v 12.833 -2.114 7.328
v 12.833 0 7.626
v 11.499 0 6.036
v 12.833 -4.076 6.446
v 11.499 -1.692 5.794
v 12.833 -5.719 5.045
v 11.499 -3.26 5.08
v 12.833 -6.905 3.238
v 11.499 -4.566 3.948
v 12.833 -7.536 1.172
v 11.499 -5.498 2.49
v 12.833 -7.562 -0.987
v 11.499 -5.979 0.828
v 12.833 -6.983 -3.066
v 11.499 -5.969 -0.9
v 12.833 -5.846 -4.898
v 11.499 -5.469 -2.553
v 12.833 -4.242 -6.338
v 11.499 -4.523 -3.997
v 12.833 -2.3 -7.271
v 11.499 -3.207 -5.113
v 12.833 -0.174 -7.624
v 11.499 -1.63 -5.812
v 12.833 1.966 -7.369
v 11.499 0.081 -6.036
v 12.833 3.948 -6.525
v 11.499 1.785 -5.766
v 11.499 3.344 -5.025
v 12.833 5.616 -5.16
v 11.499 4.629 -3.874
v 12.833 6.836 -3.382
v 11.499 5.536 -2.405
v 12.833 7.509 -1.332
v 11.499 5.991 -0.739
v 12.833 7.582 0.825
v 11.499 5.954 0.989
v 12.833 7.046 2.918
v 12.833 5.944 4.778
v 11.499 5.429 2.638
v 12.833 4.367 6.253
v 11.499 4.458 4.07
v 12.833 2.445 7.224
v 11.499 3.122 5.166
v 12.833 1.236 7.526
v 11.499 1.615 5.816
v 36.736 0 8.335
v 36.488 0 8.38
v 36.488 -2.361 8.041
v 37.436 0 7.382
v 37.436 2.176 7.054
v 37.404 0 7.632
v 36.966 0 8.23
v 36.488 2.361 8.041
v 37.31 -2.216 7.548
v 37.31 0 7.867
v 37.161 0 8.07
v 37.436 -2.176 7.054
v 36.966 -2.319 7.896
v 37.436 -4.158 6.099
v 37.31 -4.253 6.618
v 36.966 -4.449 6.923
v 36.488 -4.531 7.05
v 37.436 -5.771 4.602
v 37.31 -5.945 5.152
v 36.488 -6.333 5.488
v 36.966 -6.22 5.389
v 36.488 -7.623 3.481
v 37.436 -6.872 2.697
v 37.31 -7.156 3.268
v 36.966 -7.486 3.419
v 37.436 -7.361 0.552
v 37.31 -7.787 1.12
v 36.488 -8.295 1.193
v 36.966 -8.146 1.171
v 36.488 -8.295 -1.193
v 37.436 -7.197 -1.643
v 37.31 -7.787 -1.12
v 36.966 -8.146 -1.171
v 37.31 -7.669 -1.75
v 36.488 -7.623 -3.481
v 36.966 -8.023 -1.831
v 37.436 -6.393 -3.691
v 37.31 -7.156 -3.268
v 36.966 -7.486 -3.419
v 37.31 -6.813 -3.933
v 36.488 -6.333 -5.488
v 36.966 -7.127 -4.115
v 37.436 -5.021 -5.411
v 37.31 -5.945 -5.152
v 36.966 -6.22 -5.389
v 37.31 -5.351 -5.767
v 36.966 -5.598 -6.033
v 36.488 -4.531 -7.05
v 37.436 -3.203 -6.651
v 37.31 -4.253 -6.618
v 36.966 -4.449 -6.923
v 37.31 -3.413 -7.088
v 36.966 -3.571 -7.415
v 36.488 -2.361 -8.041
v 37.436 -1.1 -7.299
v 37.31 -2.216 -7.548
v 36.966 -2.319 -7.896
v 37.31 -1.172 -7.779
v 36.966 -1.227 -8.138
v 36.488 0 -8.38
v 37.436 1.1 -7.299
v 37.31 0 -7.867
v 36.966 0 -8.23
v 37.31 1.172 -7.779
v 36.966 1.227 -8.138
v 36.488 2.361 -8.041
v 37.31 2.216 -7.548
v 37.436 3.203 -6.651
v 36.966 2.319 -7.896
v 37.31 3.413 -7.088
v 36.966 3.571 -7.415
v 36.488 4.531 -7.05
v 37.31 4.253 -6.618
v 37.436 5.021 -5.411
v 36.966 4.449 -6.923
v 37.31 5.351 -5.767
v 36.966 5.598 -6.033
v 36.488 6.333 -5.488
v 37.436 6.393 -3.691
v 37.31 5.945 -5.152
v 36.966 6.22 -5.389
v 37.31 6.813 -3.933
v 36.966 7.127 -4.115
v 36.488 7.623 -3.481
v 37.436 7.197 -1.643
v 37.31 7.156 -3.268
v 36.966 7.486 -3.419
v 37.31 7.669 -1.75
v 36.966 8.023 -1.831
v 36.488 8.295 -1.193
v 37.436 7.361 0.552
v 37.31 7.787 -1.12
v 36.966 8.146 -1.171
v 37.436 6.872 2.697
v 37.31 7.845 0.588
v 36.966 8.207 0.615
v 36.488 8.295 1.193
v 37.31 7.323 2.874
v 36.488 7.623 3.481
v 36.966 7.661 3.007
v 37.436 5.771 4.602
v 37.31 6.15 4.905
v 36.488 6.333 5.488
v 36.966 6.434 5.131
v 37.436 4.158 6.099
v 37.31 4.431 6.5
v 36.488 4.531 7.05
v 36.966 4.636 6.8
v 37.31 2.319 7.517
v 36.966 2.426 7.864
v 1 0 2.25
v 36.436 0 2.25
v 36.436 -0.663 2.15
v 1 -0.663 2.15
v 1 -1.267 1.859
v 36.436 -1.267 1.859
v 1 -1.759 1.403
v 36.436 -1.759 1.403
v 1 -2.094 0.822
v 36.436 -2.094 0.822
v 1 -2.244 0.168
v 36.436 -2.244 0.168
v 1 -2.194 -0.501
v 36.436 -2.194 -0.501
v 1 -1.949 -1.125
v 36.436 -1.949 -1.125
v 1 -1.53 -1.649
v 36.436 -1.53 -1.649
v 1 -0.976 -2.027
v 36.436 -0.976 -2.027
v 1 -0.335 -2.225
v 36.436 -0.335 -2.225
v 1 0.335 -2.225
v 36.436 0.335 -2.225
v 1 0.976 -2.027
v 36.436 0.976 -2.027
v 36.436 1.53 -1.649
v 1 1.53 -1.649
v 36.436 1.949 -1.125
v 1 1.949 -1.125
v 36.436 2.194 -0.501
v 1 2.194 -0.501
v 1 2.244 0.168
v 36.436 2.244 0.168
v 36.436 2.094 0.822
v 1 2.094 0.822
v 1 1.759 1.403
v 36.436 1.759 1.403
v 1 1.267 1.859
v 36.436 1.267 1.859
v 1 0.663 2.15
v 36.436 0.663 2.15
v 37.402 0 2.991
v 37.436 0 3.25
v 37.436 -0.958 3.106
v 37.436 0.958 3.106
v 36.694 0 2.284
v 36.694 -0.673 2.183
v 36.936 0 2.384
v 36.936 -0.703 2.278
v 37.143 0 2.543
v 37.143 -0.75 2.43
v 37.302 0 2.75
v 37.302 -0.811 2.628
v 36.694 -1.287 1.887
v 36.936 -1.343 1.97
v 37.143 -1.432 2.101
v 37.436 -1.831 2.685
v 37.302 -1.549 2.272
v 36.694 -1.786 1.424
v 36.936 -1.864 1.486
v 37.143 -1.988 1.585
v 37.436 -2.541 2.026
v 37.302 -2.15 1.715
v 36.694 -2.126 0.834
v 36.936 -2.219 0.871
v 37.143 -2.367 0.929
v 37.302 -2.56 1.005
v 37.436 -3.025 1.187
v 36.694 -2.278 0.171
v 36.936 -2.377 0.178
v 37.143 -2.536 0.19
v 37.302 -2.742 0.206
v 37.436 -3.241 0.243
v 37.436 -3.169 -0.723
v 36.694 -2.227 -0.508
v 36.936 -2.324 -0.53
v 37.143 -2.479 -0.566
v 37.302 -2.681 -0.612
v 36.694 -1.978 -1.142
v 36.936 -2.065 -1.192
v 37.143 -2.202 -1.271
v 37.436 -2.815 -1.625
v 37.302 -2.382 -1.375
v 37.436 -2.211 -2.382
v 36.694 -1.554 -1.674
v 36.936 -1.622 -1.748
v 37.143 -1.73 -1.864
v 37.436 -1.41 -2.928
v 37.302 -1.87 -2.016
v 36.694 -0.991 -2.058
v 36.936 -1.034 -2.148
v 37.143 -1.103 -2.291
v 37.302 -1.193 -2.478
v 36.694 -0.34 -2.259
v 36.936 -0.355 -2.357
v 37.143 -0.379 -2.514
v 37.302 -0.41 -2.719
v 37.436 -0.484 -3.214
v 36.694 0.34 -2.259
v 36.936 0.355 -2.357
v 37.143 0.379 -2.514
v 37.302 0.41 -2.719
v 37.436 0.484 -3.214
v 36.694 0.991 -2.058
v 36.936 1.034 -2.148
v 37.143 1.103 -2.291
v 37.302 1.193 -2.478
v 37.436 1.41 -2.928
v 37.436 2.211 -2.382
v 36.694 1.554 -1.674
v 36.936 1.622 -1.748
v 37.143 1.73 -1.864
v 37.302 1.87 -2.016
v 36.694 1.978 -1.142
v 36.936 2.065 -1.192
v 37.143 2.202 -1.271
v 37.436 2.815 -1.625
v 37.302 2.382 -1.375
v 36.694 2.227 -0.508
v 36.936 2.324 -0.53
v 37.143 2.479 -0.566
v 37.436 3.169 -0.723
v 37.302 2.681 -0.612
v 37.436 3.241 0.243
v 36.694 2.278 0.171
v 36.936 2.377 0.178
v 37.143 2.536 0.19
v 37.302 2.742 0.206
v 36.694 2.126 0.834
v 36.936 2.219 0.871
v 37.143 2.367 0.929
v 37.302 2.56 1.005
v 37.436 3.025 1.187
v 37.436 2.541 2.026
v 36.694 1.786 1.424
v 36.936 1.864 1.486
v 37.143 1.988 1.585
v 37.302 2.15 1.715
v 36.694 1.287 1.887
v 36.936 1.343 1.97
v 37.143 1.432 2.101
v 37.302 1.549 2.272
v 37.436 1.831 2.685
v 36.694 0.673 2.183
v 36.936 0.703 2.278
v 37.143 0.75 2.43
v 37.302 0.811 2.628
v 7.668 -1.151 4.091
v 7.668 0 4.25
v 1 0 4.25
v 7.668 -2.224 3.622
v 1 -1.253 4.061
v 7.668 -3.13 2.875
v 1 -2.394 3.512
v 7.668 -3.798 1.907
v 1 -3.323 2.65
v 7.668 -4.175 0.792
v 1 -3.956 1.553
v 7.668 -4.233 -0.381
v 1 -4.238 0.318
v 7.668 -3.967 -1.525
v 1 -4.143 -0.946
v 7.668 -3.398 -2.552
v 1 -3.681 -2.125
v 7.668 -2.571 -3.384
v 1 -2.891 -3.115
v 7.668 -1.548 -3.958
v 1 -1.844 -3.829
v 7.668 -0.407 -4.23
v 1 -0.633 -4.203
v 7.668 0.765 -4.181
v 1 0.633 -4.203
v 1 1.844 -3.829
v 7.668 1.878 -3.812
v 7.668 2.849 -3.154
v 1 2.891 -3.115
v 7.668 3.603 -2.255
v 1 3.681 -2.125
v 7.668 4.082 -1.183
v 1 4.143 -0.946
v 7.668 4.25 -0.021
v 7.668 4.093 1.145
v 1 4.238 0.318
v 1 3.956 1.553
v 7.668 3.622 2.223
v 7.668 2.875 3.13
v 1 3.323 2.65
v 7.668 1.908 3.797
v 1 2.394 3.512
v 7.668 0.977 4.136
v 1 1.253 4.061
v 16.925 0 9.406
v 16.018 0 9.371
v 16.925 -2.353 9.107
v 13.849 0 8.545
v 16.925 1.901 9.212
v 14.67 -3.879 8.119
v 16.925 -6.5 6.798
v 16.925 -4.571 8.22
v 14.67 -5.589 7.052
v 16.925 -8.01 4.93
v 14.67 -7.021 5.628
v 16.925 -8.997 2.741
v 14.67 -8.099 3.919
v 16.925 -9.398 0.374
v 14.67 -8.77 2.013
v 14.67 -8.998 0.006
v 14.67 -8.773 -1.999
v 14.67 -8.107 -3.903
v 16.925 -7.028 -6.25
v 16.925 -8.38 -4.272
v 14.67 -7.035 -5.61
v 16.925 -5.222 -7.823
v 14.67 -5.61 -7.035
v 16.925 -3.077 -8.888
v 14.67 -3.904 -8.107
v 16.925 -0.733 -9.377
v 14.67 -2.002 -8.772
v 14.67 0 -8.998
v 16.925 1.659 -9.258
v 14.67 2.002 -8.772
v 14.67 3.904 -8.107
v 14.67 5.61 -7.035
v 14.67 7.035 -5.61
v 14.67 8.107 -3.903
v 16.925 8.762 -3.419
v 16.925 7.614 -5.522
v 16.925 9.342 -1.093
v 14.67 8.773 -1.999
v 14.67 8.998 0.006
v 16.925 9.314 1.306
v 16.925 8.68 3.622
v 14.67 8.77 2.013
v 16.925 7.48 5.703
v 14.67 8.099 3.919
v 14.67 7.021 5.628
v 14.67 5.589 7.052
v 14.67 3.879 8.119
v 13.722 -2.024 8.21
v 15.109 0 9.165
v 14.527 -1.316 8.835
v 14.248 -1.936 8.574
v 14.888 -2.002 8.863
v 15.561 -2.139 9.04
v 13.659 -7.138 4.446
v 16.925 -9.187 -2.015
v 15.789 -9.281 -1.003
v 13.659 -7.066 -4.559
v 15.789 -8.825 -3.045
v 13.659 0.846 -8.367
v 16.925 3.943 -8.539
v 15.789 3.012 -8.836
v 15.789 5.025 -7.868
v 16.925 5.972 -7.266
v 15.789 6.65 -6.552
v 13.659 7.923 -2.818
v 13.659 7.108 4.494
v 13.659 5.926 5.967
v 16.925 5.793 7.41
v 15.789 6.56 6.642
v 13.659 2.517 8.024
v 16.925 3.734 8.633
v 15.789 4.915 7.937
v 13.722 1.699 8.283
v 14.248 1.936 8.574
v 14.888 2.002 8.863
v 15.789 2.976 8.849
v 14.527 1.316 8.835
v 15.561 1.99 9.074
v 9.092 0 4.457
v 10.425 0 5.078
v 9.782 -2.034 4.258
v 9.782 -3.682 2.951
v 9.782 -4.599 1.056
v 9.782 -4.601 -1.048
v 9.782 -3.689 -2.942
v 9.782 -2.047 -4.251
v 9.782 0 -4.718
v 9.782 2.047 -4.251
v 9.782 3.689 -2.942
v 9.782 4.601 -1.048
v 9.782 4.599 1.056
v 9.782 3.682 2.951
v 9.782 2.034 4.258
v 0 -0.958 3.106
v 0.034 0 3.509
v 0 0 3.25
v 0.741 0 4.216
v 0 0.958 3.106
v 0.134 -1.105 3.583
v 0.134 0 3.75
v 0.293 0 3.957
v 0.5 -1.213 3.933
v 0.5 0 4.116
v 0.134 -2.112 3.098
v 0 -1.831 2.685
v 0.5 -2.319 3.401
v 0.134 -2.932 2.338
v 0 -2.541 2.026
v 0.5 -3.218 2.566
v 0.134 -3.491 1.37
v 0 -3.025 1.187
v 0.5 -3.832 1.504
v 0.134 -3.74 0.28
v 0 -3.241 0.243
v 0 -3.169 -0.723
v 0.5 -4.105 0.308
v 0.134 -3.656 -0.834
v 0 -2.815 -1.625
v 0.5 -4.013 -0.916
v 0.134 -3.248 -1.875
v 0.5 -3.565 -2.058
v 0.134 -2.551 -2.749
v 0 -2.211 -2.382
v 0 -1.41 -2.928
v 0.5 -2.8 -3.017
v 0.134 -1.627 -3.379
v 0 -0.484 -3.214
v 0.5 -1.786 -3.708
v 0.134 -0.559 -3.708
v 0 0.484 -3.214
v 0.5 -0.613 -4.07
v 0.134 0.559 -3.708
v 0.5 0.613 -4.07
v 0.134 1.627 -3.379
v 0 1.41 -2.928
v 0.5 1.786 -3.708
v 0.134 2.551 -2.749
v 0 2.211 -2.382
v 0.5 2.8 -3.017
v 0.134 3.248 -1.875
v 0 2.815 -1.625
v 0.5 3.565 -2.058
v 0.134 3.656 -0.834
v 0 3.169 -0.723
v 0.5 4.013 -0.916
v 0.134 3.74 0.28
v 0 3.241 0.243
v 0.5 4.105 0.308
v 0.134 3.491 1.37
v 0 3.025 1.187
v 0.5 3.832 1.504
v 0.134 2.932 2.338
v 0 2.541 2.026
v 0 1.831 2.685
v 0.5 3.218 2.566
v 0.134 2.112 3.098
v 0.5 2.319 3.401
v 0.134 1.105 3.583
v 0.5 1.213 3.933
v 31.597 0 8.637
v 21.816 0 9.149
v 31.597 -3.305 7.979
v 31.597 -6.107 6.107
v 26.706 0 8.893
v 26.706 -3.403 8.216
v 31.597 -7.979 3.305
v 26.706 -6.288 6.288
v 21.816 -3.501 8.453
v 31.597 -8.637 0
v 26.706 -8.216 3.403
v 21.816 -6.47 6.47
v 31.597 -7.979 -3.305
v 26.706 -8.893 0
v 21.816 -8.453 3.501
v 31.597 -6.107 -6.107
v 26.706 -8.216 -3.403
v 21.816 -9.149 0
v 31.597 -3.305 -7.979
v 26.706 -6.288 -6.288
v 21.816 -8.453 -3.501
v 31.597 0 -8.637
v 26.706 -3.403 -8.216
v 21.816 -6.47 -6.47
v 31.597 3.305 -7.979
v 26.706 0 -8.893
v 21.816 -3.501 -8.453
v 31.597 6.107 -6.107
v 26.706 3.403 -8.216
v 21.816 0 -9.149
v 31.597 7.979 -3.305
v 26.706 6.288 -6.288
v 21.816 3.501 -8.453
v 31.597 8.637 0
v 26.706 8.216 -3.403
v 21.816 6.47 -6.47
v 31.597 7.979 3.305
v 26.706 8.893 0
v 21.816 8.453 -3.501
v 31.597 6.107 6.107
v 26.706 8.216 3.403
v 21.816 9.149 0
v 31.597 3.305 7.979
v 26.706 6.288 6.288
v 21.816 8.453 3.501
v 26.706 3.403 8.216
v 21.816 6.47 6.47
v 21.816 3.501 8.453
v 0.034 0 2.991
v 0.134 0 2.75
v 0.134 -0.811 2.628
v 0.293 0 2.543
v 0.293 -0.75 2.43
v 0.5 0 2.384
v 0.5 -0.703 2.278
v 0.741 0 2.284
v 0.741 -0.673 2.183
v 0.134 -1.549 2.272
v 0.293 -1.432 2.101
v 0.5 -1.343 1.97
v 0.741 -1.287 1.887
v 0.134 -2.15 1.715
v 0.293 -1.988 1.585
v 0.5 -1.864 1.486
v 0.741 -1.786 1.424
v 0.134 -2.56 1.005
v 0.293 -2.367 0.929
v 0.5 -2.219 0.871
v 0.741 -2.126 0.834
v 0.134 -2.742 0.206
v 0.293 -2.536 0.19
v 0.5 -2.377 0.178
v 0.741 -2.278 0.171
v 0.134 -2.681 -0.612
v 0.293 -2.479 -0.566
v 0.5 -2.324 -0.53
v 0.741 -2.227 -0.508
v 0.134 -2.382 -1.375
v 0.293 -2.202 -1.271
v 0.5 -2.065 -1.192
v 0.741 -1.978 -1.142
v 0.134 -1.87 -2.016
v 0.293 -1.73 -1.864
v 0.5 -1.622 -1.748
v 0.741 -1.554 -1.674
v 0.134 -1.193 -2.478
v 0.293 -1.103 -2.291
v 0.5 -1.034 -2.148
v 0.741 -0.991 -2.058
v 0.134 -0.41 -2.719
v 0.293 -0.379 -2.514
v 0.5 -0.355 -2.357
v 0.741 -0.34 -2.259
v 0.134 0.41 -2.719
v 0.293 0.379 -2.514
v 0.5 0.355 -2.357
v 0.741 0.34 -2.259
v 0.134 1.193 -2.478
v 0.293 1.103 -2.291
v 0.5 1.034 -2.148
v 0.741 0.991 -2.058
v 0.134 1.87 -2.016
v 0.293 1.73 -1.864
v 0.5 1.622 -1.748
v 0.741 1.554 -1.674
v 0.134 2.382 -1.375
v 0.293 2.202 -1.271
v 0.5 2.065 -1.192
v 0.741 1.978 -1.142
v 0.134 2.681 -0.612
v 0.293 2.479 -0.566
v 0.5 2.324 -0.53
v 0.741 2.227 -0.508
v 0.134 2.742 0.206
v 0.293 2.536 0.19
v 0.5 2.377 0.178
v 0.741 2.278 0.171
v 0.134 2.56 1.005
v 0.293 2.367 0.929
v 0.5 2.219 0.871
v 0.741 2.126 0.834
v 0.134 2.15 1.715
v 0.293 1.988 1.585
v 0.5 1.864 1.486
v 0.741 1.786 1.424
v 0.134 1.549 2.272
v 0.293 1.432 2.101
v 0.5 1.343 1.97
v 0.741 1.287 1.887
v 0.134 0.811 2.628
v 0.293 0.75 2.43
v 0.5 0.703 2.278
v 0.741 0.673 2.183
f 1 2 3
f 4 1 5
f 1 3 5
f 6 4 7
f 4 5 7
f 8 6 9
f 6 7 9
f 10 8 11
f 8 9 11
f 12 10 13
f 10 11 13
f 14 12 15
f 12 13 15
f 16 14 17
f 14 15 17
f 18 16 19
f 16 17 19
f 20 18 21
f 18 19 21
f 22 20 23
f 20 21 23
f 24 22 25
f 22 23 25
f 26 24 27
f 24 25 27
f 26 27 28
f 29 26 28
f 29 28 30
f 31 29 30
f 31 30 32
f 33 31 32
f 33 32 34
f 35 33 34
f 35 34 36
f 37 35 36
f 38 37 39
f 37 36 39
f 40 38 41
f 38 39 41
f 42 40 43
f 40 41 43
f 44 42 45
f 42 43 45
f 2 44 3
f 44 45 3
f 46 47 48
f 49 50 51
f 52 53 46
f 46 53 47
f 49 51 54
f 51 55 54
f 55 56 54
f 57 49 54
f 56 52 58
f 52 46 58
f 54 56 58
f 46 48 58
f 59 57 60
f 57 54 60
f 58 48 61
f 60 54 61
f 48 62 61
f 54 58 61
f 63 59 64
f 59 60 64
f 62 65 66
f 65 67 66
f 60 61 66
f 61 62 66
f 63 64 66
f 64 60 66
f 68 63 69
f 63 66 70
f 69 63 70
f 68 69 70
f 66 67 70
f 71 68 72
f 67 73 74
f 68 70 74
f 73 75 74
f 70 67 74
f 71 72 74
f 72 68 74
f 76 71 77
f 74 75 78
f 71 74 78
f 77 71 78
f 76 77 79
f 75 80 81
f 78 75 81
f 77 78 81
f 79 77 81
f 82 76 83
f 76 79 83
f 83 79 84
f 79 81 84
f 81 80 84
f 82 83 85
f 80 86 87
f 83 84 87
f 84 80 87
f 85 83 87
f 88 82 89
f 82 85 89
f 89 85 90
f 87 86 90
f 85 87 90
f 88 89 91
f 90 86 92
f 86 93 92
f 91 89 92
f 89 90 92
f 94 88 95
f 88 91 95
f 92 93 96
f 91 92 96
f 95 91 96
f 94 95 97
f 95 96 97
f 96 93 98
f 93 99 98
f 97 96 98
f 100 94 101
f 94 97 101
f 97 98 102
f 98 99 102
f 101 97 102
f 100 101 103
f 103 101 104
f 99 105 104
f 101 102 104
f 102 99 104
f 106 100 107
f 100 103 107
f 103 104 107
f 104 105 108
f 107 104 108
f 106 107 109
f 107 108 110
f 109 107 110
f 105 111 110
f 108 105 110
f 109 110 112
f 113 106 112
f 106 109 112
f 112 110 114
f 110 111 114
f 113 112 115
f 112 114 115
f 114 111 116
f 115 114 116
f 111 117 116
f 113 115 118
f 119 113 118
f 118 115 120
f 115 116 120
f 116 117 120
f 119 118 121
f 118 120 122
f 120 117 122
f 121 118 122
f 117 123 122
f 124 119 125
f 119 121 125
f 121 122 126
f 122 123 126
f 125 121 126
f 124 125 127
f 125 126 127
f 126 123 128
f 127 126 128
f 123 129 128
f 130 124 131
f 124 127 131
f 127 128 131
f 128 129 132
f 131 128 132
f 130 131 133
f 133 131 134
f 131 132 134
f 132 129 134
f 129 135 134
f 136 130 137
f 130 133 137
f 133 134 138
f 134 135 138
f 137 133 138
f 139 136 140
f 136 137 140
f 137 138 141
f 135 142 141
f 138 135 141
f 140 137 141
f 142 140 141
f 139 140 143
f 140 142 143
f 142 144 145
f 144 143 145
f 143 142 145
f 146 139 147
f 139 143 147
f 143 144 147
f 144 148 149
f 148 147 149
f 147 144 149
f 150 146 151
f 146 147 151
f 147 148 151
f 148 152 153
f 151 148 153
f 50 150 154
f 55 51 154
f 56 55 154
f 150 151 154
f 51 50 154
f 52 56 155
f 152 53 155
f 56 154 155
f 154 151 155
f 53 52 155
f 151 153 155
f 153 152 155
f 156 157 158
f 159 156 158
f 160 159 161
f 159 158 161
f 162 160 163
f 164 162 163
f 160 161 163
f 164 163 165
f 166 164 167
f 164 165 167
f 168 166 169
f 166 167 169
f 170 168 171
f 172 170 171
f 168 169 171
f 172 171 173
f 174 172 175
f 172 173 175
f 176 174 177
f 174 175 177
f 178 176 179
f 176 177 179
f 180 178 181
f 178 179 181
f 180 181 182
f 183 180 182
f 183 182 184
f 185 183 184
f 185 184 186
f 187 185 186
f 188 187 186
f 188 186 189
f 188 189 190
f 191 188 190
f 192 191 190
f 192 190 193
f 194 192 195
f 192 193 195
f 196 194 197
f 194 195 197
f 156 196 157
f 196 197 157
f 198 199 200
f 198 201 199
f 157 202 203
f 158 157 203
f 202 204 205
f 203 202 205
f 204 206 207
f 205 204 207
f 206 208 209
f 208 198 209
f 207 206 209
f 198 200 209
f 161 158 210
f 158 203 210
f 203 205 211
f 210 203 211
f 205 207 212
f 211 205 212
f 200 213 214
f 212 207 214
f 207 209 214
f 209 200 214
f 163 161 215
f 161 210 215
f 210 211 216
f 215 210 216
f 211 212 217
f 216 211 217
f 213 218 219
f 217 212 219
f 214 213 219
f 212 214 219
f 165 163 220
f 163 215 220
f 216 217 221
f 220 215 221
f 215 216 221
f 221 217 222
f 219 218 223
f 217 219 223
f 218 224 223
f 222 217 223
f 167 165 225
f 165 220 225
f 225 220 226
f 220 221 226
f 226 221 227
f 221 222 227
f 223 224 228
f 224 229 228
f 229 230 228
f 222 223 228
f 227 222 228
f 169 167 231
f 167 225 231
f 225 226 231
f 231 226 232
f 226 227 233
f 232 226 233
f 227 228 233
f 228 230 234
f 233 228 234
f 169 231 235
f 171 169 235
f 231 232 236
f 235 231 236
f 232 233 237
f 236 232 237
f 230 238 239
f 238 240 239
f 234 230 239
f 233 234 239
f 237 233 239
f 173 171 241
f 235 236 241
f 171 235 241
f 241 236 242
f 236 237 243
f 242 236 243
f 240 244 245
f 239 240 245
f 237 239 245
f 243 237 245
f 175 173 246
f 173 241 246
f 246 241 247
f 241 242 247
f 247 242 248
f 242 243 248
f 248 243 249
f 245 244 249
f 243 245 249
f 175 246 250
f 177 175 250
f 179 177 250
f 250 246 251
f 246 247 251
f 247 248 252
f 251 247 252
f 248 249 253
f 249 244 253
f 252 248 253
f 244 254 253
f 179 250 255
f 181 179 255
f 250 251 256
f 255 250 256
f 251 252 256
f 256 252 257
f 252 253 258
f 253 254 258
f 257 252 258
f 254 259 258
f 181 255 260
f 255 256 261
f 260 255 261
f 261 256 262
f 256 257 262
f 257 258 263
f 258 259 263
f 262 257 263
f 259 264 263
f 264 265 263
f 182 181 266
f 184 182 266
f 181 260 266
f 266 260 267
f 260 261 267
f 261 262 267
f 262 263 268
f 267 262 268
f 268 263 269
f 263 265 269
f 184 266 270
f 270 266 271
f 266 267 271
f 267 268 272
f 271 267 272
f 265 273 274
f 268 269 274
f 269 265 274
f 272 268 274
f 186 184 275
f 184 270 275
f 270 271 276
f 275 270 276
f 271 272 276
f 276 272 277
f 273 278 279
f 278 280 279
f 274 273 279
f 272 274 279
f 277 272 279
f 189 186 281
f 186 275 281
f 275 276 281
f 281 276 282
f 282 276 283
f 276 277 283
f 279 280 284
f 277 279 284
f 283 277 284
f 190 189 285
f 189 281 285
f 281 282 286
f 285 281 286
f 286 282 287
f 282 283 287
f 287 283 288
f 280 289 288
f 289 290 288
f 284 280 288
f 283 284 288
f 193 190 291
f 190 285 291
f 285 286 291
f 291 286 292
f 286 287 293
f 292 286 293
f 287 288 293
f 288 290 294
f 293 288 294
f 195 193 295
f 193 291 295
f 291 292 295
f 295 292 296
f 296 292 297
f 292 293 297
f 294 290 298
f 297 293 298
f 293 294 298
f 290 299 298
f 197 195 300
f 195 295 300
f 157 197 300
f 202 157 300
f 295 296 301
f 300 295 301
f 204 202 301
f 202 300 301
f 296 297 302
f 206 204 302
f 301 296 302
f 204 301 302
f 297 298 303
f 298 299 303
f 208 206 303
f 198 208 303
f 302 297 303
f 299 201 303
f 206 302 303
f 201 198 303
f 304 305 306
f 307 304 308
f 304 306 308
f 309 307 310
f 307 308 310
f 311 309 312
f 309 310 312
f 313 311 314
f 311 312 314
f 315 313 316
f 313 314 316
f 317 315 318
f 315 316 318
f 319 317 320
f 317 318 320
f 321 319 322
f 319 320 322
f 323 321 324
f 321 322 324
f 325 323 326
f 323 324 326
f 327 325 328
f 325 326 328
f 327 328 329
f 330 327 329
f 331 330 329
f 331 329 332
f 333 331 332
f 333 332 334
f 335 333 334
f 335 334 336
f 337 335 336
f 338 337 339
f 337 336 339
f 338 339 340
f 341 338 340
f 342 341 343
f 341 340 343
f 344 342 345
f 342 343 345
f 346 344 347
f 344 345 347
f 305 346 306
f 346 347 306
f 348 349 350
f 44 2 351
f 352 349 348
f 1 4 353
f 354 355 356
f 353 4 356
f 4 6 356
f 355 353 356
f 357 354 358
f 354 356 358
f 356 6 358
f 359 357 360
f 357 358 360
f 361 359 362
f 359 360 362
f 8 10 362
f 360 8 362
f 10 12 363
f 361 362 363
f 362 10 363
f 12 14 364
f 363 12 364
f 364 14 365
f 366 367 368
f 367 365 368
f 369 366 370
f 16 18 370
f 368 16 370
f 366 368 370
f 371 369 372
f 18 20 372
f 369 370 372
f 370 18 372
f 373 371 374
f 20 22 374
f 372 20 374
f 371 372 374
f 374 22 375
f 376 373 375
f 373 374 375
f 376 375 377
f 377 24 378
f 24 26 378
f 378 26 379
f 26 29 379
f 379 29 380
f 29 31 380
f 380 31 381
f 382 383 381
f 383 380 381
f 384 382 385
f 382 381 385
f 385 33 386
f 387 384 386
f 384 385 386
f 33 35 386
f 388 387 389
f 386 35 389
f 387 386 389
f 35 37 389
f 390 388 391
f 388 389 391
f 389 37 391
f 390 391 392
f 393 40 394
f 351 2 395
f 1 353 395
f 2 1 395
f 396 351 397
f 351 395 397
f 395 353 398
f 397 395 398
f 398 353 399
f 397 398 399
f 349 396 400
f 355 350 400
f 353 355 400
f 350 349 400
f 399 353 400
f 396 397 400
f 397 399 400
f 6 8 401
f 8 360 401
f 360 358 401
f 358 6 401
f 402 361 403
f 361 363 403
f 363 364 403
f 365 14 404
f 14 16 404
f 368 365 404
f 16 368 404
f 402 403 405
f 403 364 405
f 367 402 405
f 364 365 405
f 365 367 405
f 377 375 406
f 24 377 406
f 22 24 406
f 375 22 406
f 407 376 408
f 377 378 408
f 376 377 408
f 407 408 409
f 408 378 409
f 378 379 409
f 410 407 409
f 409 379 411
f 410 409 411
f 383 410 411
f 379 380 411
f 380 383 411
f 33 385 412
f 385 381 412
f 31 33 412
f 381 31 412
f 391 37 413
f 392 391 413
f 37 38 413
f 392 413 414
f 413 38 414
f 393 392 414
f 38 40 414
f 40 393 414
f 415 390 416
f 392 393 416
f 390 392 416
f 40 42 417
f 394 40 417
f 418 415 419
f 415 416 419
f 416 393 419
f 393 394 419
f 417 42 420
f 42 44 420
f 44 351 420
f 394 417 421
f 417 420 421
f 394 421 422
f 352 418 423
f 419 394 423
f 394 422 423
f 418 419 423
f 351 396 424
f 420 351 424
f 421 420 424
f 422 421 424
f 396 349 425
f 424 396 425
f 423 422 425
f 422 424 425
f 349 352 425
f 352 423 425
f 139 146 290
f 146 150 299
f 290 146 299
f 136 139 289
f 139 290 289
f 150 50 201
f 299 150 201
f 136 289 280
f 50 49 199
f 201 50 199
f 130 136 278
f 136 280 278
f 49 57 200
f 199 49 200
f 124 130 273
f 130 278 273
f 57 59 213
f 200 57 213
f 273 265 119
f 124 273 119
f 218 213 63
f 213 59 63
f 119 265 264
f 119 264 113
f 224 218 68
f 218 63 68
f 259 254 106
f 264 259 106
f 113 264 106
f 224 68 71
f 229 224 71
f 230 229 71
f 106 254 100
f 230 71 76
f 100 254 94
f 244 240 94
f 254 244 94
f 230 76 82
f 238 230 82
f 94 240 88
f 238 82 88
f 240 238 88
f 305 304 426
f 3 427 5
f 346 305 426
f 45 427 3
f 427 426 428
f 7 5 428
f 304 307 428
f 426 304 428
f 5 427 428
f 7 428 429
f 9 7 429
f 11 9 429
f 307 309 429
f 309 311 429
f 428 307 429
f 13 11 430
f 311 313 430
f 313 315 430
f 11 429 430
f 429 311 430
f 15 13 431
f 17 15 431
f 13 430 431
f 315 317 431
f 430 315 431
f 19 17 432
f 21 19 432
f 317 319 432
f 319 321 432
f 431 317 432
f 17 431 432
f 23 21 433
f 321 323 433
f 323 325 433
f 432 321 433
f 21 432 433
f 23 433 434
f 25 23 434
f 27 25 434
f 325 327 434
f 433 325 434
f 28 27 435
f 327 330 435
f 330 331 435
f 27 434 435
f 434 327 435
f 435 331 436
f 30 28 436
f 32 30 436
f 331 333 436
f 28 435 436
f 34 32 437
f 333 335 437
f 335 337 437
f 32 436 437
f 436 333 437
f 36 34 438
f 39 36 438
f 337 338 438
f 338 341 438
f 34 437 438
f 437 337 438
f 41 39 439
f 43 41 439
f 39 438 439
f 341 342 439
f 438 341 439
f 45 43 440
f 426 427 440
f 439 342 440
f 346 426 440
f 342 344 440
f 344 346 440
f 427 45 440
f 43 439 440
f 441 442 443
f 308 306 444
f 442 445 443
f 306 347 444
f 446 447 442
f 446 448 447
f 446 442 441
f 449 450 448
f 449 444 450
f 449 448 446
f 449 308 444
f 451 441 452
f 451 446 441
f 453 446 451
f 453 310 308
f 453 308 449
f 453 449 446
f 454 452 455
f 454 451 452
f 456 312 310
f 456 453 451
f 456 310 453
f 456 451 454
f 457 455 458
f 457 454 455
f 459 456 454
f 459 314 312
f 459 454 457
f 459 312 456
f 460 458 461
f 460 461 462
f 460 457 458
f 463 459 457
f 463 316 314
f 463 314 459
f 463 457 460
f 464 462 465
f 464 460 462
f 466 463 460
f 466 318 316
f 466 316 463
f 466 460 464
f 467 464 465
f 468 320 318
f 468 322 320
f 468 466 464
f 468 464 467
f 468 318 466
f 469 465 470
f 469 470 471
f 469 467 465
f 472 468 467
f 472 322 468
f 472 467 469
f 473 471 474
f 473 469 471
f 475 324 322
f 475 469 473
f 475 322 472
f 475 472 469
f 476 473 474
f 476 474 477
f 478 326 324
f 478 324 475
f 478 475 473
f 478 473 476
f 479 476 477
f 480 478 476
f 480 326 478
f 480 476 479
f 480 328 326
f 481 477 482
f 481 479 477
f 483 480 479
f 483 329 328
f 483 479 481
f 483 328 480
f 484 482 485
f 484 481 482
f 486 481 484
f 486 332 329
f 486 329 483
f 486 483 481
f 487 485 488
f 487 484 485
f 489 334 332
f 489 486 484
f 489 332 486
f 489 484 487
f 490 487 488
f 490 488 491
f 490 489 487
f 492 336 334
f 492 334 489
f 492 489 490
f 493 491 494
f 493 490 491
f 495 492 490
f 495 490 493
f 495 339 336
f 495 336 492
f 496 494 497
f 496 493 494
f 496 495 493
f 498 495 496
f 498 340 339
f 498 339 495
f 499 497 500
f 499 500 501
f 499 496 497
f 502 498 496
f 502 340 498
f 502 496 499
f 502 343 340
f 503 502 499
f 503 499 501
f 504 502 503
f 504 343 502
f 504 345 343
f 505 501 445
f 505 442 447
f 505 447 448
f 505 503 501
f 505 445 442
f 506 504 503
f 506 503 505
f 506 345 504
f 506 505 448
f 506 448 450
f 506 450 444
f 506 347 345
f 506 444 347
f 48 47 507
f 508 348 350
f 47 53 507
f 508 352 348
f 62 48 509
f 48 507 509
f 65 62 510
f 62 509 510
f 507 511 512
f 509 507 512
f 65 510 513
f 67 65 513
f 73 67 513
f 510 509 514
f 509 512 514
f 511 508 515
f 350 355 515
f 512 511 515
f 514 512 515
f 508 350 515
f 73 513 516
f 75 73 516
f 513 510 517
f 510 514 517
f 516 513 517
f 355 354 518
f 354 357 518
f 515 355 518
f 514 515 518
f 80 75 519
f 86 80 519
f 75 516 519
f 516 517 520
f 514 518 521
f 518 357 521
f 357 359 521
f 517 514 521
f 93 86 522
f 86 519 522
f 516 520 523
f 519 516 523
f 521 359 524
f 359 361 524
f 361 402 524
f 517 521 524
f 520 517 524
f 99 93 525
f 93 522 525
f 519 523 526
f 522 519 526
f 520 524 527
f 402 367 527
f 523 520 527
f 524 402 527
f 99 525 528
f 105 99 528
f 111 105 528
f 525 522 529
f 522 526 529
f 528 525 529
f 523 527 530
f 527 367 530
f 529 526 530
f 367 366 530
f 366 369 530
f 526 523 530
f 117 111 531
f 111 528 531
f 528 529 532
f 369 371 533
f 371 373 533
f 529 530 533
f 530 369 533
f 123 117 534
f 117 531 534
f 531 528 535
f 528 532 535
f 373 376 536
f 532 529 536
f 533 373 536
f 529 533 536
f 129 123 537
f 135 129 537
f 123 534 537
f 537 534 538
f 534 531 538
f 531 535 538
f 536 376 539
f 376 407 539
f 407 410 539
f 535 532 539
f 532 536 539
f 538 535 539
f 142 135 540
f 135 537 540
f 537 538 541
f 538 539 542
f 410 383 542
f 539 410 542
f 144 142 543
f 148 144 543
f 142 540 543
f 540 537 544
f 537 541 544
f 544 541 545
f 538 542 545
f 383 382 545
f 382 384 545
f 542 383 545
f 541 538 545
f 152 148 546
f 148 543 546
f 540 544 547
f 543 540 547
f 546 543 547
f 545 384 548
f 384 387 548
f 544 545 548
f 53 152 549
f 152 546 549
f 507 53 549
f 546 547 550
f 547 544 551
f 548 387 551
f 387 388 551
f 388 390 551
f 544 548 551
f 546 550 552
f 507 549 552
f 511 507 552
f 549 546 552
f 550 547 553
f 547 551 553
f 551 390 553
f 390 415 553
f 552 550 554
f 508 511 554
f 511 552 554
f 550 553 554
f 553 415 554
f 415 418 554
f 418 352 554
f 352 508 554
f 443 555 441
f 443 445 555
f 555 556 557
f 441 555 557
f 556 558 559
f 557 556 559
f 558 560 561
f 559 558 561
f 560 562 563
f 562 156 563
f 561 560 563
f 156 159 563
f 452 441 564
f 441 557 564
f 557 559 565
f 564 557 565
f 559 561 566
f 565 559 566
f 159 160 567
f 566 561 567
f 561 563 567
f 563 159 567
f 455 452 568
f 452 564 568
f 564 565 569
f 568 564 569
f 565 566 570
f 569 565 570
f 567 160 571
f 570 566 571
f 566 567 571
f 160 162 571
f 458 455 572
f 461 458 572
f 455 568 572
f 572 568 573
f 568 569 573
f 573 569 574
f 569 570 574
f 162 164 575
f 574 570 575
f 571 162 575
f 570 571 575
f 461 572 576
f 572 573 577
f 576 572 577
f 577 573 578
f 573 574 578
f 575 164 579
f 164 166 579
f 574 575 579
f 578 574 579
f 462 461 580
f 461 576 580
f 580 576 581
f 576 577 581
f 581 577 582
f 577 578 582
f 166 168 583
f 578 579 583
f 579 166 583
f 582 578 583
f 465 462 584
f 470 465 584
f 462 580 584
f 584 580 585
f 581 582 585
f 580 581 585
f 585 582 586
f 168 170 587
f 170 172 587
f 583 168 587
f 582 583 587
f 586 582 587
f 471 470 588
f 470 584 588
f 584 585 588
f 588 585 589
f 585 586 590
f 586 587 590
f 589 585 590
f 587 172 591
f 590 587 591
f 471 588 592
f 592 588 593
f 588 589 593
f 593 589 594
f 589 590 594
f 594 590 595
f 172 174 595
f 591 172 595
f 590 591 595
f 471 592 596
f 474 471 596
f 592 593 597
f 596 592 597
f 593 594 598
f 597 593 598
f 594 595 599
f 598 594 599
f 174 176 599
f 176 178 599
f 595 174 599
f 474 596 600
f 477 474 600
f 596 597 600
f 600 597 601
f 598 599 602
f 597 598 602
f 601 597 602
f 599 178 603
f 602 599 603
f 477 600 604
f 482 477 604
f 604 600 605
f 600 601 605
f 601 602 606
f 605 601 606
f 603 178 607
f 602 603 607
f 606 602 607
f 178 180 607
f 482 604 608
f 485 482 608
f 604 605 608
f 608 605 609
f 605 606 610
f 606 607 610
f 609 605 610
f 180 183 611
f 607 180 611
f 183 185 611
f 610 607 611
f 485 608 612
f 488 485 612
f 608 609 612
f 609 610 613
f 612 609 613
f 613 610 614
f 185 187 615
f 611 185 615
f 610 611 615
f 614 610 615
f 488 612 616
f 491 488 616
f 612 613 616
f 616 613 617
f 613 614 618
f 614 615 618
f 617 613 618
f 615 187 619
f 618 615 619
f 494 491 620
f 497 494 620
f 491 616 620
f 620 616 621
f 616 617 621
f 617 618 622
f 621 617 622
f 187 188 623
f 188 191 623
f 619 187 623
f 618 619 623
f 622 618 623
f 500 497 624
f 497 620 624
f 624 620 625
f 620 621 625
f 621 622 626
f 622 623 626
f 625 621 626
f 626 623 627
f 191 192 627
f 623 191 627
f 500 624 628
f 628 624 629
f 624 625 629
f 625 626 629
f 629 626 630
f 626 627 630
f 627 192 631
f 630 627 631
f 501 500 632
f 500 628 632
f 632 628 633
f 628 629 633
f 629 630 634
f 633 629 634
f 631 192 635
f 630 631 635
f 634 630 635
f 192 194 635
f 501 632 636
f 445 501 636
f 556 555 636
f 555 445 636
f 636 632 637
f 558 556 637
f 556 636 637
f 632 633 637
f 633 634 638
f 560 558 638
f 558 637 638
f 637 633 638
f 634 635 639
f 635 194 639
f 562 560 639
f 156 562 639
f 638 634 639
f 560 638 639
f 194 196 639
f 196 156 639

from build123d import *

# Parameters (mm, degrees)
F2_R = 0.99999
F3_R = 5


# Not quite as in the source:
# - a fillet or chamfer is up to 0.001 mm smaller than in the source, because OpenCascade refuses the exact size


with BuildPart() as f1:
    # F0 (on Front) → F1 (revolve)
    with BuildSketch(Plane.XZ):
        Polygon((0, 4.25), (0, 2.25), (14.4355785643, 2.25), (37.4355785643, 2.25), (37.4355785643, 8.3307377657), (14.4355785643, 9.5361166892), (10, 4.25), align=None)
    revolve(axis=Axis((-40, 0, 0), (1, 0, 0)))

    # F2 (radius 1 in the source; OpenCascade refuses exactly that, so slightly less here)
    f2_edges = [f1.edges().sort_by_distance(p)[0] for p in [
        (0, 0, -4.25),
        (37.435579, 0, -8.330738),
        (37.435579, 0, -2.25),
        (0, 0, -2.25),
    ]]
    fillet(f2_edges, radius=F2_R)

    # F3
    f3_edges = [f1.edges().sort_by_distance(p)[0] for p in [
        (14.435579, 0, -9.536117),
        (10, 0, -4.25),
    ]]
    fillet(f3_edges, radius=F3_R)


solid = f1.part
